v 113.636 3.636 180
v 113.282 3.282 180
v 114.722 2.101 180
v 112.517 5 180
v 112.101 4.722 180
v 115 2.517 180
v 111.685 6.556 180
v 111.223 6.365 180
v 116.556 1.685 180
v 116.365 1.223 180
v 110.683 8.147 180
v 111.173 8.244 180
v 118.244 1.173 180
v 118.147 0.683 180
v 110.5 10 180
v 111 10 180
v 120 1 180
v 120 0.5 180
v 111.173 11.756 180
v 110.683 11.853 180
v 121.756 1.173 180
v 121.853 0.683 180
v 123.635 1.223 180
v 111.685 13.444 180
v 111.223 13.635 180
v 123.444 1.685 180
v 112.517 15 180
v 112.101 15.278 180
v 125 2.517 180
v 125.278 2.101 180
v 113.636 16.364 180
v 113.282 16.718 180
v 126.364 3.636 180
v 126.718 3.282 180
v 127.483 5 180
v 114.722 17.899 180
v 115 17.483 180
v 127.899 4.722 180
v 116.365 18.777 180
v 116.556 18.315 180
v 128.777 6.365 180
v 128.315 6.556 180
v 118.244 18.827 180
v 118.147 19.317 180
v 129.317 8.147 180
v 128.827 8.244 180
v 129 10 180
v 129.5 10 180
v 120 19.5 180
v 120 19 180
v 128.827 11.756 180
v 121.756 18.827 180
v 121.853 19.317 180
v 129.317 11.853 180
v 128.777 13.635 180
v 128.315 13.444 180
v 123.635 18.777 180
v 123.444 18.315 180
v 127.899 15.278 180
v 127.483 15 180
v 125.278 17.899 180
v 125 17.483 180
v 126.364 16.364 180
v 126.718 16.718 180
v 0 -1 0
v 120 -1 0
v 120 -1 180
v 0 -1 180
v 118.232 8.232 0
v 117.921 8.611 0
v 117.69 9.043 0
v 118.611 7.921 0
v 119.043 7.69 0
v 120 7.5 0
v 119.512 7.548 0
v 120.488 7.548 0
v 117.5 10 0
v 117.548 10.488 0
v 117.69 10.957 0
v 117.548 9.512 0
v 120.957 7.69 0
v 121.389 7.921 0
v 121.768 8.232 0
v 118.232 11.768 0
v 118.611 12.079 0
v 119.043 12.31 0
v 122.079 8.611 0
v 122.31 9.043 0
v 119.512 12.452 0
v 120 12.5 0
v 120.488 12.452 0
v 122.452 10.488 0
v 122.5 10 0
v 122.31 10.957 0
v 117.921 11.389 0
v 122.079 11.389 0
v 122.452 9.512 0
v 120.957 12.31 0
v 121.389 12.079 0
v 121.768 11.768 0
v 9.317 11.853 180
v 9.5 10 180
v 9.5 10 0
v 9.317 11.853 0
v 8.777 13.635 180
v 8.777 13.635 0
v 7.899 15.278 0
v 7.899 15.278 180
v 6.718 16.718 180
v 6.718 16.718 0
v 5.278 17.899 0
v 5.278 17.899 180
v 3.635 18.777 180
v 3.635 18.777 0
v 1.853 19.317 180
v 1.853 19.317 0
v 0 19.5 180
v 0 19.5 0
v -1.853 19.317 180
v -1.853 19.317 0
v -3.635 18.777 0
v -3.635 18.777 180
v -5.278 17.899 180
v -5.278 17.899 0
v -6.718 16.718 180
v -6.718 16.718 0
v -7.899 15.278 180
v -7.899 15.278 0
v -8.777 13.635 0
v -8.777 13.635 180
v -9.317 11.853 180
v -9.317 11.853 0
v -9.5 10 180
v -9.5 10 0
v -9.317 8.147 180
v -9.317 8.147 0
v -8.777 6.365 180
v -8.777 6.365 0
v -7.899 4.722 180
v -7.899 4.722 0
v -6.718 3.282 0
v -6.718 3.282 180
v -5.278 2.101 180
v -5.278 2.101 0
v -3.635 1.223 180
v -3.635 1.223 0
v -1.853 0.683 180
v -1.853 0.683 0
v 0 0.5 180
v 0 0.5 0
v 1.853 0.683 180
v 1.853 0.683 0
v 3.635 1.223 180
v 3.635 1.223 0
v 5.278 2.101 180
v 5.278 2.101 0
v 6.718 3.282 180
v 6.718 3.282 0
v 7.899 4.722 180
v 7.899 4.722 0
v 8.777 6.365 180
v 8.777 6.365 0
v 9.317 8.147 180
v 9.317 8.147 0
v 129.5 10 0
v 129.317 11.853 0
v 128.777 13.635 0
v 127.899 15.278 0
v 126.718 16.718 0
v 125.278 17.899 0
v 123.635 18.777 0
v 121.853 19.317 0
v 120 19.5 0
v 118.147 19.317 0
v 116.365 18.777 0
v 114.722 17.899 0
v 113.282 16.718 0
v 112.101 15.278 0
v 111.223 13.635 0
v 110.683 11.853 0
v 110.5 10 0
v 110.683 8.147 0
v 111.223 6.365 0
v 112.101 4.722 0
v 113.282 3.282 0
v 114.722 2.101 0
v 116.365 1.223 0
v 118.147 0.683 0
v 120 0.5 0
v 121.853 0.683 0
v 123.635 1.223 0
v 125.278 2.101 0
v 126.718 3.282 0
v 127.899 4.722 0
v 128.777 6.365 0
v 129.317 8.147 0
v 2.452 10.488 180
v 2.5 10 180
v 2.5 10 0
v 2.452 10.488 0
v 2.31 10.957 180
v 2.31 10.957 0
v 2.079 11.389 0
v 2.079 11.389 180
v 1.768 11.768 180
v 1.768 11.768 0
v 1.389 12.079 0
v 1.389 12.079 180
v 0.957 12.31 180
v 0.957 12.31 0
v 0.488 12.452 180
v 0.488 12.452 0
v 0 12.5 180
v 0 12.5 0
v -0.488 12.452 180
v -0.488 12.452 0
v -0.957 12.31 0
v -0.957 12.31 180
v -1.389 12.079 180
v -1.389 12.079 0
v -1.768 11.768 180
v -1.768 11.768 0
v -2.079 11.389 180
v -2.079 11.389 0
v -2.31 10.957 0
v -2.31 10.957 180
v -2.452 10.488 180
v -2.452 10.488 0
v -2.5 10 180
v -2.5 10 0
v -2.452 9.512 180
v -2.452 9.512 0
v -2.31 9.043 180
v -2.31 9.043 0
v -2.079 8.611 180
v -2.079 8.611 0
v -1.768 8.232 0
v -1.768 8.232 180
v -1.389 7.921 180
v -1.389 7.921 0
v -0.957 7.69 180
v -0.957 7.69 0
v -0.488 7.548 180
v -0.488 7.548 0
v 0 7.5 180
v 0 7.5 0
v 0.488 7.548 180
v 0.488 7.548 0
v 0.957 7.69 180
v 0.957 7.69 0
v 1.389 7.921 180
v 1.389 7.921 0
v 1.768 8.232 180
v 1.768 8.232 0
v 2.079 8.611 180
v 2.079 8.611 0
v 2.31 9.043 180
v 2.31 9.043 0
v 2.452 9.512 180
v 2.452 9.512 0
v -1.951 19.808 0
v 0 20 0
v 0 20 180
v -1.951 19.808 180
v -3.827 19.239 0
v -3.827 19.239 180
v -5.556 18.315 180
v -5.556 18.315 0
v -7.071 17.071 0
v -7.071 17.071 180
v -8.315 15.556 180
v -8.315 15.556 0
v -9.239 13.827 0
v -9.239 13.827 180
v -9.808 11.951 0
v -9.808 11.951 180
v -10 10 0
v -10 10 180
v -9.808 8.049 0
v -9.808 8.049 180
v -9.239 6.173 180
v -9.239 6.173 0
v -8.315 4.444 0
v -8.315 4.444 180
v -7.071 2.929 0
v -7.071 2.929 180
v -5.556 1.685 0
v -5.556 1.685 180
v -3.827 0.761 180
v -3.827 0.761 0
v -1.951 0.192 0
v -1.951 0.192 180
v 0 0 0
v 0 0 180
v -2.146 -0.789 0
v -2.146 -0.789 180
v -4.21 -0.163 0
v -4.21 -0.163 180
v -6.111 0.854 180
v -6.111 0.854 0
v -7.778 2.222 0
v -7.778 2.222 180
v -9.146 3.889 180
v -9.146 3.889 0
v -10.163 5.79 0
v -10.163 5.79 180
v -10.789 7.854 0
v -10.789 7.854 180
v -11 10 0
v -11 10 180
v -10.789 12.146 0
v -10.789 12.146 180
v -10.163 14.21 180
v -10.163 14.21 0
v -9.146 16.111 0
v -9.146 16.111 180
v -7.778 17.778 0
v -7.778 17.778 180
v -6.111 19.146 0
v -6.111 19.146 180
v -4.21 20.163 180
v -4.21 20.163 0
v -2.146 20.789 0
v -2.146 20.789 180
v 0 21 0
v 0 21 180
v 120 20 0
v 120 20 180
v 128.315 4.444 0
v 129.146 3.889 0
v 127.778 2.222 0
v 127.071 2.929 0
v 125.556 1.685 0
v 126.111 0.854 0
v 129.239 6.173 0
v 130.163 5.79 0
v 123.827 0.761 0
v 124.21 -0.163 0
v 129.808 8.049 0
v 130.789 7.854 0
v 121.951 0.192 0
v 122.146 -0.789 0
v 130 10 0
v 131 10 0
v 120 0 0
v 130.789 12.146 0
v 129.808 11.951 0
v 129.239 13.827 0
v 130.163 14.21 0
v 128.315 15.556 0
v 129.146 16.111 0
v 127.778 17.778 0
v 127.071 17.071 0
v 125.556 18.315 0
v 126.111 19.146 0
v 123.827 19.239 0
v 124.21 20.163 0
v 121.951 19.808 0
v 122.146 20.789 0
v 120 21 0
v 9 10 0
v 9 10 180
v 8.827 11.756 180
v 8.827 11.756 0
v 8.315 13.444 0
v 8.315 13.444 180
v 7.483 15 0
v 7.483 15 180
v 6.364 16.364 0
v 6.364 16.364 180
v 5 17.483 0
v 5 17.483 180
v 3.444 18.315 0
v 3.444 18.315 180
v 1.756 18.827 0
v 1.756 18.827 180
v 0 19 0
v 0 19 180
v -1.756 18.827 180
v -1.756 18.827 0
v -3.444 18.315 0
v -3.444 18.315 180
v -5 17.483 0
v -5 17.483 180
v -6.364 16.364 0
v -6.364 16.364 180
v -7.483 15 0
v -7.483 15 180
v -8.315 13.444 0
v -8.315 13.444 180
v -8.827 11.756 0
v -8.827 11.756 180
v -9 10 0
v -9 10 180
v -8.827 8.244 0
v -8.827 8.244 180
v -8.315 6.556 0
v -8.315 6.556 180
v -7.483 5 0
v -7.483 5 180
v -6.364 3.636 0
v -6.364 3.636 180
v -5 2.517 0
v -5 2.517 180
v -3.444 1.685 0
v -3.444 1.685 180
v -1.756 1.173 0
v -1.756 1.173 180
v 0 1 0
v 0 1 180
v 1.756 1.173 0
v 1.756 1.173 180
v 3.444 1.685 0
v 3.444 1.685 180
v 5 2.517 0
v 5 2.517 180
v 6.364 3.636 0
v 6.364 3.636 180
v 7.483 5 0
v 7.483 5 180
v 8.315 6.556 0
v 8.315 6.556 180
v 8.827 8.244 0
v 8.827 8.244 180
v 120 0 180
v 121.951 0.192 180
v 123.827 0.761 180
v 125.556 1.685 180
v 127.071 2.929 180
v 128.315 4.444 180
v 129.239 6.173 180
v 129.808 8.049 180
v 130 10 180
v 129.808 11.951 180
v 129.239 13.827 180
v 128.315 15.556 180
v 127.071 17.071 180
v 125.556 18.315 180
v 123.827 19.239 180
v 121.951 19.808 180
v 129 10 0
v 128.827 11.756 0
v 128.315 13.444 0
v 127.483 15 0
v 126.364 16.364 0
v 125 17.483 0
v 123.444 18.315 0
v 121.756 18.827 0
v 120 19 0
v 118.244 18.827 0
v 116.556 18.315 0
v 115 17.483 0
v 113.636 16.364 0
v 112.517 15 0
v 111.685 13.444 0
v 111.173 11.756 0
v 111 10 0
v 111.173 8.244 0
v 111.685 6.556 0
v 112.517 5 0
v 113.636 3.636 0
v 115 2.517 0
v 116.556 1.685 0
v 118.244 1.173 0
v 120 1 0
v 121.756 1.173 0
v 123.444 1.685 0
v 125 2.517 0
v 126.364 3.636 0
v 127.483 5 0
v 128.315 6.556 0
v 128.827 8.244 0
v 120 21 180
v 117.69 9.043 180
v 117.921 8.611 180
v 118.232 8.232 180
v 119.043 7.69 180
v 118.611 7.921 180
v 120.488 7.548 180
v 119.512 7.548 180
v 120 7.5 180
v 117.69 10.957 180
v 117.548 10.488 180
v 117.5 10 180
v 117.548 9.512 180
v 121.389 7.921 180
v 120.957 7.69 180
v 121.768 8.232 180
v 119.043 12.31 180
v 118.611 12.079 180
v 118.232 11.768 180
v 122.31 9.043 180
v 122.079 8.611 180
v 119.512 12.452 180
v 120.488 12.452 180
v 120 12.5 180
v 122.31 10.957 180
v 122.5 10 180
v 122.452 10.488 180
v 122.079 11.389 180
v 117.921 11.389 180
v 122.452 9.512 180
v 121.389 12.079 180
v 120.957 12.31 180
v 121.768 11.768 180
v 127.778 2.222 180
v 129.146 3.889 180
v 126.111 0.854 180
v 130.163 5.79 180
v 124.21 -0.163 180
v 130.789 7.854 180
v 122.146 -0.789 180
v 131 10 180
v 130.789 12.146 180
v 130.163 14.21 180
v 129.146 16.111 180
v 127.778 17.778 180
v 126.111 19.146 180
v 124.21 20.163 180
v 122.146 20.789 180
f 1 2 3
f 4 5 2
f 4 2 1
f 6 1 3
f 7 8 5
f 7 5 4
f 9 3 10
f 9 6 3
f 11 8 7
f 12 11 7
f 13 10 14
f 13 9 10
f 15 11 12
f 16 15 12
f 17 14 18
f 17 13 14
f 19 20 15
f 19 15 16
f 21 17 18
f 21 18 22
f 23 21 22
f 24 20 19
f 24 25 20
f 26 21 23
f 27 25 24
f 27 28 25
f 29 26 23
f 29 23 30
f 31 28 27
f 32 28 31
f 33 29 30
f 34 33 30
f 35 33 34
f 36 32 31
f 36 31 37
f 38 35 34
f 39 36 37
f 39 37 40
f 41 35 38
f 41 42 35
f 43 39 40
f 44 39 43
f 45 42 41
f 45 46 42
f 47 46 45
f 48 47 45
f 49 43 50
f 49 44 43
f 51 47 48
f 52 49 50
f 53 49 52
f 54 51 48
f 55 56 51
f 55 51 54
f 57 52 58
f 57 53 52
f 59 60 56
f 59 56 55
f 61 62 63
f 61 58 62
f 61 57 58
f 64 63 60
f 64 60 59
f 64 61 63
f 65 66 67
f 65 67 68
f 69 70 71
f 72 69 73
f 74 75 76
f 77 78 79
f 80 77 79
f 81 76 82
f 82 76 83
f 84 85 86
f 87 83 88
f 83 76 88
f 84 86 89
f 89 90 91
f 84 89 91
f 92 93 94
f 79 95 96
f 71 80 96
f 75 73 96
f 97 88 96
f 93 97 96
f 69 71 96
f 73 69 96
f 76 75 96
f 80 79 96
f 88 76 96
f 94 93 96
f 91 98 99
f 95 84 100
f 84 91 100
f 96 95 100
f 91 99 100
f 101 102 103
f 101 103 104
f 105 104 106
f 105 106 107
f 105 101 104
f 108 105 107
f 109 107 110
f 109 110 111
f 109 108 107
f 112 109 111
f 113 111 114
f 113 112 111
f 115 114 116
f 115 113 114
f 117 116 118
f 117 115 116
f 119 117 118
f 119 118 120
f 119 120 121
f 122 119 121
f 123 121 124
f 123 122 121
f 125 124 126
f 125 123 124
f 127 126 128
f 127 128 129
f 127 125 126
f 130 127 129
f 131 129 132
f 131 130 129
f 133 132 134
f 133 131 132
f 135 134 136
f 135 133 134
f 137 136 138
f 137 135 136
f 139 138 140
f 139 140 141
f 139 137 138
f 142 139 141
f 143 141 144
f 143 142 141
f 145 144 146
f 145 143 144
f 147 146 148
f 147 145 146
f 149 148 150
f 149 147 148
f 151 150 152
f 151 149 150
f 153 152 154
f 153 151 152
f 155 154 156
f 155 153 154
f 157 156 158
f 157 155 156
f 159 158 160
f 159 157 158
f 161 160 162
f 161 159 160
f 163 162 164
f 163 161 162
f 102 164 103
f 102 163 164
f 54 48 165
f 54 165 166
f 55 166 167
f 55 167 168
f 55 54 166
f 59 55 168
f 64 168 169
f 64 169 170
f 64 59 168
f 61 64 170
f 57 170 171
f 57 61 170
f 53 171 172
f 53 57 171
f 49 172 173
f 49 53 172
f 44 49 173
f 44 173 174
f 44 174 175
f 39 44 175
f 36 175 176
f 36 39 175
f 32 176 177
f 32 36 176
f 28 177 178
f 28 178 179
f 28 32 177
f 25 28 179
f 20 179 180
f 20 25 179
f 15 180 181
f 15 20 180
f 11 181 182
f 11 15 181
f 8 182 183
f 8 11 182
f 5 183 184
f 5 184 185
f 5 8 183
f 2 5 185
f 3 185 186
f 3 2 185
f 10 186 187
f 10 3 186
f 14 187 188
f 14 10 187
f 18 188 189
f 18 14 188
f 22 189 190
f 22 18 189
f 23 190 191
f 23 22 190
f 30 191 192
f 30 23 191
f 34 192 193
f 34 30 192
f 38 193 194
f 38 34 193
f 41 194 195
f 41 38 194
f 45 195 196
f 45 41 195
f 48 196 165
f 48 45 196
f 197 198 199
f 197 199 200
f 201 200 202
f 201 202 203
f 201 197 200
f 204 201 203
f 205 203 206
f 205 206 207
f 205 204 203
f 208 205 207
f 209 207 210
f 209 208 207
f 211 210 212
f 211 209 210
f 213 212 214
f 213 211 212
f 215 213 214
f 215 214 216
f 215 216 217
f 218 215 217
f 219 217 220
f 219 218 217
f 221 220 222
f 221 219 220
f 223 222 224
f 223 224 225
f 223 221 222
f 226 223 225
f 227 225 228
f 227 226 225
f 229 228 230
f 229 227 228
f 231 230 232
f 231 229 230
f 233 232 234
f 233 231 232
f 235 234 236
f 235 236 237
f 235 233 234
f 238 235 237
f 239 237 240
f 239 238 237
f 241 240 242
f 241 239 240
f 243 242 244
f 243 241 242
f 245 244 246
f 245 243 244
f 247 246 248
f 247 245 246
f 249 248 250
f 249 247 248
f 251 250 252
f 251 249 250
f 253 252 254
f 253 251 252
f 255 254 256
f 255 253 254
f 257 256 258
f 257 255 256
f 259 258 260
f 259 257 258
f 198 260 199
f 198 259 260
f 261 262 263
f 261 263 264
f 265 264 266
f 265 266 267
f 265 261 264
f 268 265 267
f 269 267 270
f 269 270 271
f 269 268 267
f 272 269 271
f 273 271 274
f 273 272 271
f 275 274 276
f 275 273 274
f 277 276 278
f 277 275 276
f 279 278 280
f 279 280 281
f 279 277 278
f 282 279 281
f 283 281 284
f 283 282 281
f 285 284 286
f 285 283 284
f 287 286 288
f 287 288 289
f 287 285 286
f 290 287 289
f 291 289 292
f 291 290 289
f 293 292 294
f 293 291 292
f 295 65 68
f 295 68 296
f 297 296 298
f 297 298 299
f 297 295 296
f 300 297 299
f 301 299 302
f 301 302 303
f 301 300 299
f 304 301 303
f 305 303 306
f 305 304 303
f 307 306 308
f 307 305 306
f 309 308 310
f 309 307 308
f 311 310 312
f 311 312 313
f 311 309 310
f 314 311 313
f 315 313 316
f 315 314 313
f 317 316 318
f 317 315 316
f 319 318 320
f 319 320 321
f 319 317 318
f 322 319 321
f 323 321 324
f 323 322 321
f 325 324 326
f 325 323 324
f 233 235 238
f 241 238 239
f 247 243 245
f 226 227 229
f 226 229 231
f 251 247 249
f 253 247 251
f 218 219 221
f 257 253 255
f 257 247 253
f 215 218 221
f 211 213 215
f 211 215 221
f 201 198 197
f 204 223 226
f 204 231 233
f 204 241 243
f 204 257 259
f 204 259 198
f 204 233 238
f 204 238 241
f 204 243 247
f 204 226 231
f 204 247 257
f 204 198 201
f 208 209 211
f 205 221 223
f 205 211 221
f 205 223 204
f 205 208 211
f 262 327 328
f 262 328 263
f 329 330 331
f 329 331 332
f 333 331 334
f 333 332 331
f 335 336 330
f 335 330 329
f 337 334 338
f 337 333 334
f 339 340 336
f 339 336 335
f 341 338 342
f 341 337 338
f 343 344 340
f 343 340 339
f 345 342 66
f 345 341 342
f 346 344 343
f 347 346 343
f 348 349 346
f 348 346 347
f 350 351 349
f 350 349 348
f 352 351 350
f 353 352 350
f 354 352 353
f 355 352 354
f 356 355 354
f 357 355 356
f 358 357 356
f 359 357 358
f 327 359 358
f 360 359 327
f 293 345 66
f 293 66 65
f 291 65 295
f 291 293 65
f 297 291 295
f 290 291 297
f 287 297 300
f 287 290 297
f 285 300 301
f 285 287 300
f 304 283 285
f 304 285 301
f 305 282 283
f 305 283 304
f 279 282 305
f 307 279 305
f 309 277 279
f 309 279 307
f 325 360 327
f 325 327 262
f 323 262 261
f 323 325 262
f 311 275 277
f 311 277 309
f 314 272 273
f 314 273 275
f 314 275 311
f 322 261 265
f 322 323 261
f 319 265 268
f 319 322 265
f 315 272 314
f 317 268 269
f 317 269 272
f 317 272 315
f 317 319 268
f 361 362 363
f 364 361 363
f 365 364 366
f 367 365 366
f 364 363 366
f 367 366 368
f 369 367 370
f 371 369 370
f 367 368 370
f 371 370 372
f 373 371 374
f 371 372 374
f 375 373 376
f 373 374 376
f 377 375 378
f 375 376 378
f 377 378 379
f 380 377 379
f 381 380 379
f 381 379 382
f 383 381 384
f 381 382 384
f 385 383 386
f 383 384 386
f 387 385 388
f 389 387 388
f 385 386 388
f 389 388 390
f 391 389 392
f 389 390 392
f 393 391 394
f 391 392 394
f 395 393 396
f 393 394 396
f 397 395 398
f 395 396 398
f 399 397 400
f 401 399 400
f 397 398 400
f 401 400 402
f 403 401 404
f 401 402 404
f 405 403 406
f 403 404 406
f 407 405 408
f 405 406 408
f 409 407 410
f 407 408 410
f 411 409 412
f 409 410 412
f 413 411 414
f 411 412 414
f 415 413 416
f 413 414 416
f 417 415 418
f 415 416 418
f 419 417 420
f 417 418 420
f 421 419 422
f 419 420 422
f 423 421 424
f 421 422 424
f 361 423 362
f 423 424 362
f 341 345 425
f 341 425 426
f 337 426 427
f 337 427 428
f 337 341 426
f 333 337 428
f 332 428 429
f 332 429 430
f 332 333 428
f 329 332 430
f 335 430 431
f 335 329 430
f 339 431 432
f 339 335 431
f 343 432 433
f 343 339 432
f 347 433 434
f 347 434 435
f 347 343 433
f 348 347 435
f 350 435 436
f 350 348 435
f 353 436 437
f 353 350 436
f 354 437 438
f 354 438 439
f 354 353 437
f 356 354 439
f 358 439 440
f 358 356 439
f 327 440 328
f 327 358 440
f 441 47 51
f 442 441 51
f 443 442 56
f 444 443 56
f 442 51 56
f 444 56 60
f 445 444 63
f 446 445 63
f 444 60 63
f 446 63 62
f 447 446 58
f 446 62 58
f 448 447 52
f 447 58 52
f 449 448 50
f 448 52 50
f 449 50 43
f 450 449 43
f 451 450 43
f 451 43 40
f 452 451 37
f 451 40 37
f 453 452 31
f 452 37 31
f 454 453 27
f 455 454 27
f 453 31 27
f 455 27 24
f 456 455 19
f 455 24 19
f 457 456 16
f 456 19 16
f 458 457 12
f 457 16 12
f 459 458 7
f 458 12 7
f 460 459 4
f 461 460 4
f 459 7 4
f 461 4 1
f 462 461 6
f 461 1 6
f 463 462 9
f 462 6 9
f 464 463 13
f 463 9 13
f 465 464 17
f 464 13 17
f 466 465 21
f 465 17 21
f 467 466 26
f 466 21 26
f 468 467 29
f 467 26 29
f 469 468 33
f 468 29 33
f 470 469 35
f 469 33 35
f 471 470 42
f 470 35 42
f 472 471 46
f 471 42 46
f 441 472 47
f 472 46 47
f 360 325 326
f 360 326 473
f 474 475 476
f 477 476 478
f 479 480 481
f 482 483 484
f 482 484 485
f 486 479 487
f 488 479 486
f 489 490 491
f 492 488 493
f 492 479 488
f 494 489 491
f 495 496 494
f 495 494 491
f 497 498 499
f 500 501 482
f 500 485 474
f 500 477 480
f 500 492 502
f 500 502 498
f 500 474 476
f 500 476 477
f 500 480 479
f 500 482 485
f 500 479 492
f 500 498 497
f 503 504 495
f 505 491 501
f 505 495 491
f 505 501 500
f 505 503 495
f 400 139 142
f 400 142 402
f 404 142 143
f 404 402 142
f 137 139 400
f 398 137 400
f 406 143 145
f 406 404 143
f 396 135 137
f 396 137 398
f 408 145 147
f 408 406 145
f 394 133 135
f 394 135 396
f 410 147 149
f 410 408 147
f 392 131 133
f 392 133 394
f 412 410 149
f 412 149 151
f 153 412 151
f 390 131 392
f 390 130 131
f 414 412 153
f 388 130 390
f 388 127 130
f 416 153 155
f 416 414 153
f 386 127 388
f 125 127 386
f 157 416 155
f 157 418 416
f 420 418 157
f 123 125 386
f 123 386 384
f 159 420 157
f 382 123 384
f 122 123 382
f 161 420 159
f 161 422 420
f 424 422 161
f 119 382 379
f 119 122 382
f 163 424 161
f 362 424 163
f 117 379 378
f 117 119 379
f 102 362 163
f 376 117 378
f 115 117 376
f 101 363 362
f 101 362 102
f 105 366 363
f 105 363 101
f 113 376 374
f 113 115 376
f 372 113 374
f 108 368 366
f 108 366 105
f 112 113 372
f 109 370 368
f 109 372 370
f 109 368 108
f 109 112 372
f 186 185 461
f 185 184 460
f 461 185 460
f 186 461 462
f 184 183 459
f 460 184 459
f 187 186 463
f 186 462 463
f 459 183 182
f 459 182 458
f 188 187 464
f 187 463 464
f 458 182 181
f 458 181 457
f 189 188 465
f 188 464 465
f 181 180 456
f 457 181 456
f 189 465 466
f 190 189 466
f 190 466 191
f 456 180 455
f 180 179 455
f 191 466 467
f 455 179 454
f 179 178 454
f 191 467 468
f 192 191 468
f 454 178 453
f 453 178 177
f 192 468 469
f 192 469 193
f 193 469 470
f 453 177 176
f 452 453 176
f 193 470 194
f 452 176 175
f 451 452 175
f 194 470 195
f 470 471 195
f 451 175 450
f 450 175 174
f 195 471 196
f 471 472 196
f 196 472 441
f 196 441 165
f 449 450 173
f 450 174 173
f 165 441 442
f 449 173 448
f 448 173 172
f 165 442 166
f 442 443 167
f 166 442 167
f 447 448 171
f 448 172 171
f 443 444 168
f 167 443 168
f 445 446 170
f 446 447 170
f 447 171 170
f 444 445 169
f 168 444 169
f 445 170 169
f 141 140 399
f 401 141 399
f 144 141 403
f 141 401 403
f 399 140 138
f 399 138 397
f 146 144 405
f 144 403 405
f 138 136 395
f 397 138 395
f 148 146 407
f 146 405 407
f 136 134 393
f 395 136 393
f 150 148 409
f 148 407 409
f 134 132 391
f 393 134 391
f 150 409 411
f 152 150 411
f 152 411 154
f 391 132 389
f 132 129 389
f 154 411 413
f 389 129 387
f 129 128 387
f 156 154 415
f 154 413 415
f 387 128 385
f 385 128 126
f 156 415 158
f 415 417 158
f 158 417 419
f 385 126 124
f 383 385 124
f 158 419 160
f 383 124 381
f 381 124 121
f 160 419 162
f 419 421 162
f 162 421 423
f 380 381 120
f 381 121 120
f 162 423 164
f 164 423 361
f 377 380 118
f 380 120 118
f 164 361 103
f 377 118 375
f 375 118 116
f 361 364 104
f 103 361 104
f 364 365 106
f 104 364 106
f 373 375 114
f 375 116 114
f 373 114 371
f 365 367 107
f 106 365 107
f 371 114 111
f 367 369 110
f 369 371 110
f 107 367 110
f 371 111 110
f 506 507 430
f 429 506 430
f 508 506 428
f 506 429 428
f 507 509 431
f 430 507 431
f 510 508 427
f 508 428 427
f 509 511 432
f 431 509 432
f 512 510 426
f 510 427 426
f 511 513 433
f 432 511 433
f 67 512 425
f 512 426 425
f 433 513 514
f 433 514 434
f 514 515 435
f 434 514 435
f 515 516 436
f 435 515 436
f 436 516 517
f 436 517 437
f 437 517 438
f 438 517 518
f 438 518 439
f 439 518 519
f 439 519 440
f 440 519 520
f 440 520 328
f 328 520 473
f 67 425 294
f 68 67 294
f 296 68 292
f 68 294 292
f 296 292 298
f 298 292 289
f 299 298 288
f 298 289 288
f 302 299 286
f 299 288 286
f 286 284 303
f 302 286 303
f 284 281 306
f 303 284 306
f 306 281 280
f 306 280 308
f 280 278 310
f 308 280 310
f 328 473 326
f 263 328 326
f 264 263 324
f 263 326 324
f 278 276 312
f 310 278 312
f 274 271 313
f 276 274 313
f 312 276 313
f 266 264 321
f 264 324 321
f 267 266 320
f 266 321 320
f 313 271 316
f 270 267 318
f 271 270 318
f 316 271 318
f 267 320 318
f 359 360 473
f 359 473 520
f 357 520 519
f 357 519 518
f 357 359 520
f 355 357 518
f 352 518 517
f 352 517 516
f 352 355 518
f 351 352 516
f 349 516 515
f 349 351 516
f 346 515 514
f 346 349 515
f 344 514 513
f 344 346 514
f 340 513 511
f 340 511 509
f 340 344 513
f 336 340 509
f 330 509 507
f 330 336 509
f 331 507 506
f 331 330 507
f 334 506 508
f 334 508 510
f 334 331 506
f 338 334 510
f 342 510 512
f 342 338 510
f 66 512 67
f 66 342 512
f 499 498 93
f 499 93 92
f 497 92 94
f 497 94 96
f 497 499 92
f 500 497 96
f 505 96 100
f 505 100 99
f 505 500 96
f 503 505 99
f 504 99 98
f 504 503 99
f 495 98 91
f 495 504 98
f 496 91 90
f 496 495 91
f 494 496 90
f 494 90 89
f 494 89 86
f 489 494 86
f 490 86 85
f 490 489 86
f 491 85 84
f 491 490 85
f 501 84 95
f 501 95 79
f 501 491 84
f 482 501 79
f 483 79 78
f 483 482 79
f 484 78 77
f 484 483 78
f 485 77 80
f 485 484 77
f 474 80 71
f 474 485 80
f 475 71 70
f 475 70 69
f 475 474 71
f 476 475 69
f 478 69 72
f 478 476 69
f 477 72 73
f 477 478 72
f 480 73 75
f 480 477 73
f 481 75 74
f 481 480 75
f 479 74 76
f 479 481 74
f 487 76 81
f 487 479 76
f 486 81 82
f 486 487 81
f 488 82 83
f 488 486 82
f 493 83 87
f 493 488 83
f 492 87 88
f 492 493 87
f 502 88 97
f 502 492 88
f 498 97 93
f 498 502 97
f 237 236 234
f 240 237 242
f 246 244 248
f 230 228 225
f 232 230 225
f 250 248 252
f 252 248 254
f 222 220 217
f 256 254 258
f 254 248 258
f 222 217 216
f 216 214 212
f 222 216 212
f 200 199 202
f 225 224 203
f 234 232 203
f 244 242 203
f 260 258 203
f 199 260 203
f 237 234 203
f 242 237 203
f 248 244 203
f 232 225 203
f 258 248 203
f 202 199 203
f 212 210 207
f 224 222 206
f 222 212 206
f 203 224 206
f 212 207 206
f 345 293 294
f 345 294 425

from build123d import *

# Parameters (mm, degrees)
BOSS_EXTRU_1_DEPTH   = 180
ESQUISSE2_R          = 2.5
BOSS_EXTRU_2_DEPTH   = 180
BOSS_EXTRU_2_2_DEPTH = 180
ESQUISSE3_R          = 9.5
ESQUISSE3_R_2        = 9
BOSS_EXTRU_3_DEPTH   = 180
BOSS_EXTRU_3_2_DEPTH = 180


with BuildPart() as part:
    # Esquisse1 → Boss.-Extru.1 (new body)
    with BuildSketch(Plane.XY):
        with BuildLine():
            Line((0, 21), (120, 21))
            ThreePointArc((120, 21), (131, 10), (120, -1))
            Line((120, -1), (0, -1))
            ThreePointArc((0, -1), (-11, 10), (0, 21))
        make_face()
        with BuildLine():
            Line((0, 0), (120, 0))
            ThreePointArc((120, 0), (130, 10), (120, 20))
            Line((120, 20), (0, 20))
            ThreePointArc((0, 20), (-10, 10), (0, 0))
        make_face(mode=Mode.SUBTRACT)
    extrude(amount=BOSS_EXTRU_1_DEPTH)


with BuildPart() as body_2:
    # Esquisse2 → Boss.-Extru.2 (new body)
    with BuildSketch(Plane.XY.offset(180)):
        with Locations((0, 10)):
            Circle(ESQUISSE2_R)
    extrude(amount=-BOSS_EXTRU_2_DEPTH)


with BuildPart() as body_3:
    # Esquisse2 → Boss.-Extru.2 2 (new body)
    with BuildSketch(Plane.XY.offset(180)):
        with Locations((120, 10)):
            Circle(ESQUISSE2_R)
    extrude(amount=-BOSS_EXTRU_2_2_DEPTH)


with BuildPart() as body_4:
    # Esquisse3 → Boss.-Extru.3 (new body)
    with BuildSketch(Plane.XY.offset(180)):
        with Locations((0, 10)):
            Circle(ESQUISSE3_R)
        with Locations((0, 10)):
            Circle(ESQUISSE3_R_2, mode=Mode.SUBTRACT)
    extrude(amount=-BOSS_EXTRU_3_DEPTH)


with BuildPart() as body_5:
    # Esquisse3 → Boss.-Extru.3 2 (new body)
    with BuildSketch(Plane.XY.offset(180)):
        with Locations((120, 10)):
            Circle(ESQUISSE3_R)
        with Locations((120, 10)):
            Circle(ESQUISSE3_R_2, mode=Mode.SUBTRACT)
    extrude(amount=-BOSS_EXTRU_3_2_DEPTH)


solid = Compound([part.part, body_2.part, body_3.part, body_4.part, body_5.part])
